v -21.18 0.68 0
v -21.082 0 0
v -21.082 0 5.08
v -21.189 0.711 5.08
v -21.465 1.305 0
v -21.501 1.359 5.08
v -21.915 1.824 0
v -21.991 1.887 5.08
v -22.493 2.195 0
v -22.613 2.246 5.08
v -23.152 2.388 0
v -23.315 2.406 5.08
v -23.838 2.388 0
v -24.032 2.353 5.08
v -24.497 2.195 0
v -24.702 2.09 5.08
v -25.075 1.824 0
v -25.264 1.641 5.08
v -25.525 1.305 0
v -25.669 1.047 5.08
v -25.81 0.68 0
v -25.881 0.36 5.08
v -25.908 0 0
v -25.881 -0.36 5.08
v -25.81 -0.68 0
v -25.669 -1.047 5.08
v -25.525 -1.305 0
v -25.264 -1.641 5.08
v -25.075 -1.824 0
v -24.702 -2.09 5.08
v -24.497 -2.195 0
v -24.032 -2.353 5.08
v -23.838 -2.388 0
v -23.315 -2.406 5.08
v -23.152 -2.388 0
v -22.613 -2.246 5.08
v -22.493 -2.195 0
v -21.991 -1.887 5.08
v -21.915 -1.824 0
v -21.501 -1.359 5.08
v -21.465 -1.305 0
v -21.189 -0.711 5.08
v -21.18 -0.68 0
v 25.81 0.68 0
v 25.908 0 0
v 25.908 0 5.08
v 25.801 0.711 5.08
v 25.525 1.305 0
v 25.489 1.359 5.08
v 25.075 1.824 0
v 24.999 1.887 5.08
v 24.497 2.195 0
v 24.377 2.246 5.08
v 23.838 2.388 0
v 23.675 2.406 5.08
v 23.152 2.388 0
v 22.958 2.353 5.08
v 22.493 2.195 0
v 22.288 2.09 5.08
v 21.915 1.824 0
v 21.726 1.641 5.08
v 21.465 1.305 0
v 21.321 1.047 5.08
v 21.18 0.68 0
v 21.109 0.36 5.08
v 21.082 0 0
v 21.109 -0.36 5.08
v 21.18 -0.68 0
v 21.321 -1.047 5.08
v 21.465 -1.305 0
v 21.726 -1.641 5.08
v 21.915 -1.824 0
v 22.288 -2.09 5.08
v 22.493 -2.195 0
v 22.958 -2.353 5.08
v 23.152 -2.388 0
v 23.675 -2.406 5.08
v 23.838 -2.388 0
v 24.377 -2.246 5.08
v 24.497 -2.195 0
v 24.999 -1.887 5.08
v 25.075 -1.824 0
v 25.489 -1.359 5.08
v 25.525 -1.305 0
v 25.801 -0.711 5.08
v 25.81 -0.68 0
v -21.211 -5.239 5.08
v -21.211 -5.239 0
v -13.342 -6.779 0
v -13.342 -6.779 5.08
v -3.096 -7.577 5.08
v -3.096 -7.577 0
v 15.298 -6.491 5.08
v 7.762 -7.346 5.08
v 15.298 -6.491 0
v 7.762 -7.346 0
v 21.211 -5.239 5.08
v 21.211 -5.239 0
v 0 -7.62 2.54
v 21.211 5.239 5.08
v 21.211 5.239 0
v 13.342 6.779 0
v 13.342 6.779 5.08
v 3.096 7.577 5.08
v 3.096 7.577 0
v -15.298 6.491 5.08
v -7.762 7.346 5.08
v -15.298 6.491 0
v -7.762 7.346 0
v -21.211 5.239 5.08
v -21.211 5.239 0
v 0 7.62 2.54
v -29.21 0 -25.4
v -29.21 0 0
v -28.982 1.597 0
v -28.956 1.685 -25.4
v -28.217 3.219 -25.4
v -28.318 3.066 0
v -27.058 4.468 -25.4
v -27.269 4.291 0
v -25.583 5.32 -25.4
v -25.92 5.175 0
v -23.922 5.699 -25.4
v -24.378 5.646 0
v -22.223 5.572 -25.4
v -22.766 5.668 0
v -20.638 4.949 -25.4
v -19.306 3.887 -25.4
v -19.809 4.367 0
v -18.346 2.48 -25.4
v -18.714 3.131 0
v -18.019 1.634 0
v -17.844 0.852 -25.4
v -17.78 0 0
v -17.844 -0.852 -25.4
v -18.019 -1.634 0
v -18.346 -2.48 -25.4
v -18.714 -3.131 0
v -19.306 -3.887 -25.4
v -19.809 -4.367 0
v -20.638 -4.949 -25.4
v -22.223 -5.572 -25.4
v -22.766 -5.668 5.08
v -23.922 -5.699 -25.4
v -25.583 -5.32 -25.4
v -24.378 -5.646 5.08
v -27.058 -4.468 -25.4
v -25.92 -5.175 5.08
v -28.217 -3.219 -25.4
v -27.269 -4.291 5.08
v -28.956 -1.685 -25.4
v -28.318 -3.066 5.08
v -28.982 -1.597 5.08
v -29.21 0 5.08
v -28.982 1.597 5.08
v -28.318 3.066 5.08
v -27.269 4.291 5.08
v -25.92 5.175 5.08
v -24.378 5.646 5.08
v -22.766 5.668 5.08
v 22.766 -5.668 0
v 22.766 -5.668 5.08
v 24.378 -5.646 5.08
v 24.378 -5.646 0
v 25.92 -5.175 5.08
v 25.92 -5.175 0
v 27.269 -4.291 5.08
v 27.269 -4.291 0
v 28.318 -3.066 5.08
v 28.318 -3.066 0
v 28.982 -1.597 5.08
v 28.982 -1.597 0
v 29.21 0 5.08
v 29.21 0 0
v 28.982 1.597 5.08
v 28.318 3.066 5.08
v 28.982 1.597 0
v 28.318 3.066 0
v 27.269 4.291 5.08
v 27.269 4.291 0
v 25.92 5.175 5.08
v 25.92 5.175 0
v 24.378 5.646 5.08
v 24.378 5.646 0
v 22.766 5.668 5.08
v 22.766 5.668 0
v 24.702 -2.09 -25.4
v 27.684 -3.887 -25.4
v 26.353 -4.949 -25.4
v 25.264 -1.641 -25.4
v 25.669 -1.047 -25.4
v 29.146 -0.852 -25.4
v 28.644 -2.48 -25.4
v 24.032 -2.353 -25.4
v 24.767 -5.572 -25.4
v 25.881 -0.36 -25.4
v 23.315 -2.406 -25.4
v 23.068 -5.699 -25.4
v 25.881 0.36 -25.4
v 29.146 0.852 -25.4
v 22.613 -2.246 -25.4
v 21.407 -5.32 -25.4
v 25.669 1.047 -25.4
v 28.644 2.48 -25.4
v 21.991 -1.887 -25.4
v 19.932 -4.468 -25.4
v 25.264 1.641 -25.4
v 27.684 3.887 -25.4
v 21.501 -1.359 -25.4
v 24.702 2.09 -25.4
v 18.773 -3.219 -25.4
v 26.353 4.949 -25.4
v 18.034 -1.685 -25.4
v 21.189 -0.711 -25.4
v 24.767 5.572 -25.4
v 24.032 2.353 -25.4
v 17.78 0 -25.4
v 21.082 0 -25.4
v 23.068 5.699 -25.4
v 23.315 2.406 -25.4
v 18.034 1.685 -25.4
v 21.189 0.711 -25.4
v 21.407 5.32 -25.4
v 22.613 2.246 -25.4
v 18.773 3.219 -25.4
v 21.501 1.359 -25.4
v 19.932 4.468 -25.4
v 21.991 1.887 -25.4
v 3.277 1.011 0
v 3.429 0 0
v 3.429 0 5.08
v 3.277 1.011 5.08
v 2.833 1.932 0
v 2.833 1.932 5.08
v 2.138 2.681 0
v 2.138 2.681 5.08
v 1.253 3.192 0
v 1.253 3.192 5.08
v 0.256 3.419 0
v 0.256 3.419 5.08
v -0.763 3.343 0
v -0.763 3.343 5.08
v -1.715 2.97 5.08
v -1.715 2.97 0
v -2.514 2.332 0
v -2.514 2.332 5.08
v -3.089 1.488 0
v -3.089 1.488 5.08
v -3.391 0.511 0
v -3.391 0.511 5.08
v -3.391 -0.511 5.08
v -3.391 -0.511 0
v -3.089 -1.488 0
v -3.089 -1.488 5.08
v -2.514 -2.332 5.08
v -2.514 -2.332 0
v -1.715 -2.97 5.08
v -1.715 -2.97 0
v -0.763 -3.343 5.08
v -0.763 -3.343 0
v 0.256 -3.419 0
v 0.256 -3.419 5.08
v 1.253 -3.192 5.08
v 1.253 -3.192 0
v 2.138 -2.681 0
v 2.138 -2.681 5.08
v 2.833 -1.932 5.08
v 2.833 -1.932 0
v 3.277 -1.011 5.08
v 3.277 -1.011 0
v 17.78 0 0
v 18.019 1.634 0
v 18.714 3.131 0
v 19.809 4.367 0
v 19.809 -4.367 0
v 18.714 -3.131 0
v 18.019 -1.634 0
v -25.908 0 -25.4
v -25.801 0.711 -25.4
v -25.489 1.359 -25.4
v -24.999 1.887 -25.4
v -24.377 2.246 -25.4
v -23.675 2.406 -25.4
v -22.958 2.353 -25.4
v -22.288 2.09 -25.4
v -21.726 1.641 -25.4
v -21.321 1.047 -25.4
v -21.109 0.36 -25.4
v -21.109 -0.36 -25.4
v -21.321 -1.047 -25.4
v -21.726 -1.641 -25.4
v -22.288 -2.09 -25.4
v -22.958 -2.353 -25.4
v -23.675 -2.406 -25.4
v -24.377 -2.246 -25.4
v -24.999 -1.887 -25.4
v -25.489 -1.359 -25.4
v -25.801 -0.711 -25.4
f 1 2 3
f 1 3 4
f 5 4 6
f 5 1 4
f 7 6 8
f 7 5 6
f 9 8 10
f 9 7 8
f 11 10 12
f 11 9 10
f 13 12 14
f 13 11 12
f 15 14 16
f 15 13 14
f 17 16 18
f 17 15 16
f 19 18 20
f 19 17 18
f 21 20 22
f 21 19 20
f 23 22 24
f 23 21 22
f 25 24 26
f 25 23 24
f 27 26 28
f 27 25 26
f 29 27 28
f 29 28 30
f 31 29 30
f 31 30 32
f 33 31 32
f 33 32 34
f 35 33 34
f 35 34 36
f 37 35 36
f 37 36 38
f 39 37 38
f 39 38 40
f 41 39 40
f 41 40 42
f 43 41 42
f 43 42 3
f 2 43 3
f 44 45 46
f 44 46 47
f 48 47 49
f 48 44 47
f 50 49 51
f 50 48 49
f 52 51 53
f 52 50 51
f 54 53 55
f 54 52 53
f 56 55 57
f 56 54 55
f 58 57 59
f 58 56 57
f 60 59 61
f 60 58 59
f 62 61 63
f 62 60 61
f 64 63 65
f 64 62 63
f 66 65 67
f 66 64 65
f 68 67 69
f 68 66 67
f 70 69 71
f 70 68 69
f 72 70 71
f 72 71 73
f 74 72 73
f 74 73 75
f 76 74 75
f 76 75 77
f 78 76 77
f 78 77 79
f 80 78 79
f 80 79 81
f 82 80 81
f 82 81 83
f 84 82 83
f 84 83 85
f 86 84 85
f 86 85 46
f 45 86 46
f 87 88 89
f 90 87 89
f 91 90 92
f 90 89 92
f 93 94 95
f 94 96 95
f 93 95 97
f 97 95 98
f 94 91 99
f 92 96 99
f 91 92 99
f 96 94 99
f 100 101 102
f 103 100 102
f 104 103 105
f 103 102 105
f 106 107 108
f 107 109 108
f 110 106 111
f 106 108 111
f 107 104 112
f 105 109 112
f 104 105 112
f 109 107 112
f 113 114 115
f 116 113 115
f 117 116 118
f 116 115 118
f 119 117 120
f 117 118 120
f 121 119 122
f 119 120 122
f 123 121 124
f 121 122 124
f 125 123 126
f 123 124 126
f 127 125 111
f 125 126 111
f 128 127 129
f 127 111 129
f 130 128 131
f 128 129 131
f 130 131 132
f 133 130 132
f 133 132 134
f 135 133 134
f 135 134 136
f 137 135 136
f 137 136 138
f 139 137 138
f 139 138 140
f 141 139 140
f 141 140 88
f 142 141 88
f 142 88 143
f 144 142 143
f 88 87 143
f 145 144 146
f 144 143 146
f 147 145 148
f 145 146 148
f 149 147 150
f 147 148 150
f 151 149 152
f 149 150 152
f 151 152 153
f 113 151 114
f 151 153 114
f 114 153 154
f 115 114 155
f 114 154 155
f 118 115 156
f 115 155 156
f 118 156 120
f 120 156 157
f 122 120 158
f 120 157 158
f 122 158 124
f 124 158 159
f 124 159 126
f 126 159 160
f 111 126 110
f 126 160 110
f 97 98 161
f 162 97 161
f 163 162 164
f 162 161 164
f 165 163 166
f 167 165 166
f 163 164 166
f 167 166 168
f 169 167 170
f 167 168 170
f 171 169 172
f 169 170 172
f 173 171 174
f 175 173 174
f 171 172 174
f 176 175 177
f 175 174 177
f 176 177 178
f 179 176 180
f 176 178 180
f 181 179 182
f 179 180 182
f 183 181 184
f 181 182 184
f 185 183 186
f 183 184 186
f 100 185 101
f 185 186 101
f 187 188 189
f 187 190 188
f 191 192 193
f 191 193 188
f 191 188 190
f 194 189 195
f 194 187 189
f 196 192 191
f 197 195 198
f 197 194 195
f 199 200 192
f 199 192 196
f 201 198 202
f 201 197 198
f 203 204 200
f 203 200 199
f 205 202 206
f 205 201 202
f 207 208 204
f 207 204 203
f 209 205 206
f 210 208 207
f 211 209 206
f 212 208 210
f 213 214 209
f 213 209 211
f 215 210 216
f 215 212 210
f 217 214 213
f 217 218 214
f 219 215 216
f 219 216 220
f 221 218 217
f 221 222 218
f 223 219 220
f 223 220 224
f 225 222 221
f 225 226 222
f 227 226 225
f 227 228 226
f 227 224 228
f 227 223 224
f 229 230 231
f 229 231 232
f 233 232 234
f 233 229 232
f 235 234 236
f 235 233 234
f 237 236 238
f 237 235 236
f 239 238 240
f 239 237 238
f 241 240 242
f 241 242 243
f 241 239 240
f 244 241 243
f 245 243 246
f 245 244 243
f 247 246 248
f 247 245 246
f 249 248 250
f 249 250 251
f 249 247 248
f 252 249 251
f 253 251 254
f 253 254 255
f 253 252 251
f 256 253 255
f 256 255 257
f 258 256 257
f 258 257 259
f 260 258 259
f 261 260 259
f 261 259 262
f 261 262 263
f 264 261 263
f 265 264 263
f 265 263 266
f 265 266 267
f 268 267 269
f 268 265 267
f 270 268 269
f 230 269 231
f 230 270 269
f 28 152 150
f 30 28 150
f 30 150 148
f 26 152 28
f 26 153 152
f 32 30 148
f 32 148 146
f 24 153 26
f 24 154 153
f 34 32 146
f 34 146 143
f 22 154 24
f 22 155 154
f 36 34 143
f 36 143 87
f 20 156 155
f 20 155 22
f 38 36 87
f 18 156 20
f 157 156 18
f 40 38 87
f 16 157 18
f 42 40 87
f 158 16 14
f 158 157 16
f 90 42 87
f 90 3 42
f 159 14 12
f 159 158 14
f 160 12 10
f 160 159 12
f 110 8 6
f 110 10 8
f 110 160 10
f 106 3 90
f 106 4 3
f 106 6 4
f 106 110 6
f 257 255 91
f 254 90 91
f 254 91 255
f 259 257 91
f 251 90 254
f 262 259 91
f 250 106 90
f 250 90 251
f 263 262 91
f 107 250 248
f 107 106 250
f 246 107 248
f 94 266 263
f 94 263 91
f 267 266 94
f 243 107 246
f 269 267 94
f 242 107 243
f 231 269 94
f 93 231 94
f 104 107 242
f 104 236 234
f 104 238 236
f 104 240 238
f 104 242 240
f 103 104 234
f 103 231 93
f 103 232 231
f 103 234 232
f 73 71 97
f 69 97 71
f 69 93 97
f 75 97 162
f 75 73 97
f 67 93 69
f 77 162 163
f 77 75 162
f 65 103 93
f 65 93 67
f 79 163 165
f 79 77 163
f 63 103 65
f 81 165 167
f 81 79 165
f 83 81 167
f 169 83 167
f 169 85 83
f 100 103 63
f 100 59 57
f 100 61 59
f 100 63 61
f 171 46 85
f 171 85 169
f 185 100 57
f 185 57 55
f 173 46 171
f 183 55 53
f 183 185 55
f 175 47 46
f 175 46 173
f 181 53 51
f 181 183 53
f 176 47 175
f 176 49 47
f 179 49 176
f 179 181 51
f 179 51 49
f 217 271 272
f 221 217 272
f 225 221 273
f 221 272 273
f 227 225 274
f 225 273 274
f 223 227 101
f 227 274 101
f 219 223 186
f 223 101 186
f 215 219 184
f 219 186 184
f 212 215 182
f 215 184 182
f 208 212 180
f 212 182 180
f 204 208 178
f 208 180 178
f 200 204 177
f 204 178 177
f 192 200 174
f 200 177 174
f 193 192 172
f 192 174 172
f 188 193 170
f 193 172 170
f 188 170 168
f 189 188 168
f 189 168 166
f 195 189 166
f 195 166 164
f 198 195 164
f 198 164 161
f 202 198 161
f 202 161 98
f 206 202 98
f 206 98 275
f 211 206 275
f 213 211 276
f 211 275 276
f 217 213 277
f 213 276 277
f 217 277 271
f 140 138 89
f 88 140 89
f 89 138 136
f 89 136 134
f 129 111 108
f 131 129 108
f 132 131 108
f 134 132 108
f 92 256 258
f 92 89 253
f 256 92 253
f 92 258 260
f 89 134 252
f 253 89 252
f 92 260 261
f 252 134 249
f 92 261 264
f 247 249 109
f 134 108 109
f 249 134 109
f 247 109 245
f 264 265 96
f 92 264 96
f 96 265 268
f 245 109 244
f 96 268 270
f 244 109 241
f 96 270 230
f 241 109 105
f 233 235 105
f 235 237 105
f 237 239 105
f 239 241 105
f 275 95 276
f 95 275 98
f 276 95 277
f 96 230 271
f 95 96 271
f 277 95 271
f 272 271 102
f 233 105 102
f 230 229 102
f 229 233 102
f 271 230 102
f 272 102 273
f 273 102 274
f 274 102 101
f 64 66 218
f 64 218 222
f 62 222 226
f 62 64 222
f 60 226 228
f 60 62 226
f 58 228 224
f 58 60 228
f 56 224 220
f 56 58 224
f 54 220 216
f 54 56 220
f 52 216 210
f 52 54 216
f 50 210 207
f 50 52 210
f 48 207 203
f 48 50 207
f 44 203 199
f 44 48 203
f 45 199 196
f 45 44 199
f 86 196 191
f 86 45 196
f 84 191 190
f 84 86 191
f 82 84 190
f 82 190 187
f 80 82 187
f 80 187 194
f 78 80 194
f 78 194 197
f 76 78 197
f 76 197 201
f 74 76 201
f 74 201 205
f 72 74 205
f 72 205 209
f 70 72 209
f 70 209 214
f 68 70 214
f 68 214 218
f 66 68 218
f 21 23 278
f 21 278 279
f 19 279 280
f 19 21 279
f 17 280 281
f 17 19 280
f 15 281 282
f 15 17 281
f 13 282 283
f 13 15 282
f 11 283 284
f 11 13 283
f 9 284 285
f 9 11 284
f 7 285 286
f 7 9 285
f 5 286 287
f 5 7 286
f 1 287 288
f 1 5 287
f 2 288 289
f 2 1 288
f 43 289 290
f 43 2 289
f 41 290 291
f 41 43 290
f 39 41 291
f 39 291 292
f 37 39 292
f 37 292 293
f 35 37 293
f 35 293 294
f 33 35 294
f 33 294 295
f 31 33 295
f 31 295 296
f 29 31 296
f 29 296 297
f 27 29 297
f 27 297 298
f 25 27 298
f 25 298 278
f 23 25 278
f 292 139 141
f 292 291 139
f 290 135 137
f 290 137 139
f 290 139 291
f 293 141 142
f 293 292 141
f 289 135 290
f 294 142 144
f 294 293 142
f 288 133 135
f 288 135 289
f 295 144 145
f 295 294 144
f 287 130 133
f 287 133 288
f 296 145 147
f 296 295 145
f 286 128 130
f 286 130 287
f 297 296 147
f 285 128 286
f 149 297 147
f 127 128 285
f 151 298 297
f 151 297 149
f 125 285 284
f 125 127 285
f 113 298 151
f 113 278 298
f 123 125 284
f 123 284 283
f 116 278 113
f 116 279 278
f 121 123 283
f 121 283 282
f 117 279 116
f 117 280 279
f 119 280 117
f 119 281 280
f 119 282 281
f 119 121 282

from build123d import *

# Parameters (mm, degrees)
SKETCH1_R           = 2.413
SKETCH1_R_2         = 3.429
BOSS_EXTRUDE1_DEPTH = 5.08
SKETCH2_R           = 5.715
SKETCH2_R_2         = 2.413
BOSS_EXTRUDE2_DEPTH = 25.4


with BuildPart() as part:
    # Sketch1 → Boss-Extrude1 (new body)
    with BuildSketch(Plane.XY):
        with BuildLine():
            ThreePointArc((21.211318458, -5.238895267), (29.21, 0), (21.211318458, 5.238895267))
            add(Edge.make_bspline(
                [(21.211318458, 5.238895267), (0, 11.083329031), (-21.211318458, 5.238895267)],
                knots=[3.899659671, 3.899659671, 3.899659671, 5.525118289, 5.525118289, 5.525118289], degree=2, weights=[1, 0.687519064, 1]))
            ThreePointArc((-21.211318458, 5.238895267), (-29.21, 0), (-21.211318458, -5.238895267))
            add(Edge.make_bspline(
                [(-21.211318458, -5.238895267), (0, -11.083329031), (21.211318458, -5.238895267)],
                knots=[0.758067018, 0.758067018, 0.758067018, 2.383525636, 2.383525636, 2.383525636], degree=2, weights=[1, 0.687519064, 1]))
        make_face()
        with Locations((-23.495, 0)):
            Circle(SKETCH1_R, mode=Mode.SUBTRACT)
        Circle(SKETCH1_R_2, mode=Mode.SUBTRACT)
        with Locations((23.495, 0)):
            Circle(SKETCH1_R, mode=Mode.SUBTRACT)
    extrude(amount=BOSS_EXTRUDE1_DEPTH)

    # Sketch2 → Boss-Extrude2 (add)
    with BuildSketch(Plane(origin=(0, 0, 0), x_dir=(-1, 0, 0), z_dir=(0, 0, -1))):
        with Locations((-23.495, 0)):
            Circle(SKETCH2_R)
        with Locations((-23.495, 0)):
            Circle(SKETCH2_R_2, mode=Mode.SUBTRACT)
        with Locations((23.495, 0)):
            Circle(SKETCH2_R)
        with Locations((23.495, 0)):
            Circle(SKETCH2_R_2, mode=Mode.SUBTRACT)
    extrude(amount=BOSS_EXTRUDE2_DEPTH)


solid = part.part
